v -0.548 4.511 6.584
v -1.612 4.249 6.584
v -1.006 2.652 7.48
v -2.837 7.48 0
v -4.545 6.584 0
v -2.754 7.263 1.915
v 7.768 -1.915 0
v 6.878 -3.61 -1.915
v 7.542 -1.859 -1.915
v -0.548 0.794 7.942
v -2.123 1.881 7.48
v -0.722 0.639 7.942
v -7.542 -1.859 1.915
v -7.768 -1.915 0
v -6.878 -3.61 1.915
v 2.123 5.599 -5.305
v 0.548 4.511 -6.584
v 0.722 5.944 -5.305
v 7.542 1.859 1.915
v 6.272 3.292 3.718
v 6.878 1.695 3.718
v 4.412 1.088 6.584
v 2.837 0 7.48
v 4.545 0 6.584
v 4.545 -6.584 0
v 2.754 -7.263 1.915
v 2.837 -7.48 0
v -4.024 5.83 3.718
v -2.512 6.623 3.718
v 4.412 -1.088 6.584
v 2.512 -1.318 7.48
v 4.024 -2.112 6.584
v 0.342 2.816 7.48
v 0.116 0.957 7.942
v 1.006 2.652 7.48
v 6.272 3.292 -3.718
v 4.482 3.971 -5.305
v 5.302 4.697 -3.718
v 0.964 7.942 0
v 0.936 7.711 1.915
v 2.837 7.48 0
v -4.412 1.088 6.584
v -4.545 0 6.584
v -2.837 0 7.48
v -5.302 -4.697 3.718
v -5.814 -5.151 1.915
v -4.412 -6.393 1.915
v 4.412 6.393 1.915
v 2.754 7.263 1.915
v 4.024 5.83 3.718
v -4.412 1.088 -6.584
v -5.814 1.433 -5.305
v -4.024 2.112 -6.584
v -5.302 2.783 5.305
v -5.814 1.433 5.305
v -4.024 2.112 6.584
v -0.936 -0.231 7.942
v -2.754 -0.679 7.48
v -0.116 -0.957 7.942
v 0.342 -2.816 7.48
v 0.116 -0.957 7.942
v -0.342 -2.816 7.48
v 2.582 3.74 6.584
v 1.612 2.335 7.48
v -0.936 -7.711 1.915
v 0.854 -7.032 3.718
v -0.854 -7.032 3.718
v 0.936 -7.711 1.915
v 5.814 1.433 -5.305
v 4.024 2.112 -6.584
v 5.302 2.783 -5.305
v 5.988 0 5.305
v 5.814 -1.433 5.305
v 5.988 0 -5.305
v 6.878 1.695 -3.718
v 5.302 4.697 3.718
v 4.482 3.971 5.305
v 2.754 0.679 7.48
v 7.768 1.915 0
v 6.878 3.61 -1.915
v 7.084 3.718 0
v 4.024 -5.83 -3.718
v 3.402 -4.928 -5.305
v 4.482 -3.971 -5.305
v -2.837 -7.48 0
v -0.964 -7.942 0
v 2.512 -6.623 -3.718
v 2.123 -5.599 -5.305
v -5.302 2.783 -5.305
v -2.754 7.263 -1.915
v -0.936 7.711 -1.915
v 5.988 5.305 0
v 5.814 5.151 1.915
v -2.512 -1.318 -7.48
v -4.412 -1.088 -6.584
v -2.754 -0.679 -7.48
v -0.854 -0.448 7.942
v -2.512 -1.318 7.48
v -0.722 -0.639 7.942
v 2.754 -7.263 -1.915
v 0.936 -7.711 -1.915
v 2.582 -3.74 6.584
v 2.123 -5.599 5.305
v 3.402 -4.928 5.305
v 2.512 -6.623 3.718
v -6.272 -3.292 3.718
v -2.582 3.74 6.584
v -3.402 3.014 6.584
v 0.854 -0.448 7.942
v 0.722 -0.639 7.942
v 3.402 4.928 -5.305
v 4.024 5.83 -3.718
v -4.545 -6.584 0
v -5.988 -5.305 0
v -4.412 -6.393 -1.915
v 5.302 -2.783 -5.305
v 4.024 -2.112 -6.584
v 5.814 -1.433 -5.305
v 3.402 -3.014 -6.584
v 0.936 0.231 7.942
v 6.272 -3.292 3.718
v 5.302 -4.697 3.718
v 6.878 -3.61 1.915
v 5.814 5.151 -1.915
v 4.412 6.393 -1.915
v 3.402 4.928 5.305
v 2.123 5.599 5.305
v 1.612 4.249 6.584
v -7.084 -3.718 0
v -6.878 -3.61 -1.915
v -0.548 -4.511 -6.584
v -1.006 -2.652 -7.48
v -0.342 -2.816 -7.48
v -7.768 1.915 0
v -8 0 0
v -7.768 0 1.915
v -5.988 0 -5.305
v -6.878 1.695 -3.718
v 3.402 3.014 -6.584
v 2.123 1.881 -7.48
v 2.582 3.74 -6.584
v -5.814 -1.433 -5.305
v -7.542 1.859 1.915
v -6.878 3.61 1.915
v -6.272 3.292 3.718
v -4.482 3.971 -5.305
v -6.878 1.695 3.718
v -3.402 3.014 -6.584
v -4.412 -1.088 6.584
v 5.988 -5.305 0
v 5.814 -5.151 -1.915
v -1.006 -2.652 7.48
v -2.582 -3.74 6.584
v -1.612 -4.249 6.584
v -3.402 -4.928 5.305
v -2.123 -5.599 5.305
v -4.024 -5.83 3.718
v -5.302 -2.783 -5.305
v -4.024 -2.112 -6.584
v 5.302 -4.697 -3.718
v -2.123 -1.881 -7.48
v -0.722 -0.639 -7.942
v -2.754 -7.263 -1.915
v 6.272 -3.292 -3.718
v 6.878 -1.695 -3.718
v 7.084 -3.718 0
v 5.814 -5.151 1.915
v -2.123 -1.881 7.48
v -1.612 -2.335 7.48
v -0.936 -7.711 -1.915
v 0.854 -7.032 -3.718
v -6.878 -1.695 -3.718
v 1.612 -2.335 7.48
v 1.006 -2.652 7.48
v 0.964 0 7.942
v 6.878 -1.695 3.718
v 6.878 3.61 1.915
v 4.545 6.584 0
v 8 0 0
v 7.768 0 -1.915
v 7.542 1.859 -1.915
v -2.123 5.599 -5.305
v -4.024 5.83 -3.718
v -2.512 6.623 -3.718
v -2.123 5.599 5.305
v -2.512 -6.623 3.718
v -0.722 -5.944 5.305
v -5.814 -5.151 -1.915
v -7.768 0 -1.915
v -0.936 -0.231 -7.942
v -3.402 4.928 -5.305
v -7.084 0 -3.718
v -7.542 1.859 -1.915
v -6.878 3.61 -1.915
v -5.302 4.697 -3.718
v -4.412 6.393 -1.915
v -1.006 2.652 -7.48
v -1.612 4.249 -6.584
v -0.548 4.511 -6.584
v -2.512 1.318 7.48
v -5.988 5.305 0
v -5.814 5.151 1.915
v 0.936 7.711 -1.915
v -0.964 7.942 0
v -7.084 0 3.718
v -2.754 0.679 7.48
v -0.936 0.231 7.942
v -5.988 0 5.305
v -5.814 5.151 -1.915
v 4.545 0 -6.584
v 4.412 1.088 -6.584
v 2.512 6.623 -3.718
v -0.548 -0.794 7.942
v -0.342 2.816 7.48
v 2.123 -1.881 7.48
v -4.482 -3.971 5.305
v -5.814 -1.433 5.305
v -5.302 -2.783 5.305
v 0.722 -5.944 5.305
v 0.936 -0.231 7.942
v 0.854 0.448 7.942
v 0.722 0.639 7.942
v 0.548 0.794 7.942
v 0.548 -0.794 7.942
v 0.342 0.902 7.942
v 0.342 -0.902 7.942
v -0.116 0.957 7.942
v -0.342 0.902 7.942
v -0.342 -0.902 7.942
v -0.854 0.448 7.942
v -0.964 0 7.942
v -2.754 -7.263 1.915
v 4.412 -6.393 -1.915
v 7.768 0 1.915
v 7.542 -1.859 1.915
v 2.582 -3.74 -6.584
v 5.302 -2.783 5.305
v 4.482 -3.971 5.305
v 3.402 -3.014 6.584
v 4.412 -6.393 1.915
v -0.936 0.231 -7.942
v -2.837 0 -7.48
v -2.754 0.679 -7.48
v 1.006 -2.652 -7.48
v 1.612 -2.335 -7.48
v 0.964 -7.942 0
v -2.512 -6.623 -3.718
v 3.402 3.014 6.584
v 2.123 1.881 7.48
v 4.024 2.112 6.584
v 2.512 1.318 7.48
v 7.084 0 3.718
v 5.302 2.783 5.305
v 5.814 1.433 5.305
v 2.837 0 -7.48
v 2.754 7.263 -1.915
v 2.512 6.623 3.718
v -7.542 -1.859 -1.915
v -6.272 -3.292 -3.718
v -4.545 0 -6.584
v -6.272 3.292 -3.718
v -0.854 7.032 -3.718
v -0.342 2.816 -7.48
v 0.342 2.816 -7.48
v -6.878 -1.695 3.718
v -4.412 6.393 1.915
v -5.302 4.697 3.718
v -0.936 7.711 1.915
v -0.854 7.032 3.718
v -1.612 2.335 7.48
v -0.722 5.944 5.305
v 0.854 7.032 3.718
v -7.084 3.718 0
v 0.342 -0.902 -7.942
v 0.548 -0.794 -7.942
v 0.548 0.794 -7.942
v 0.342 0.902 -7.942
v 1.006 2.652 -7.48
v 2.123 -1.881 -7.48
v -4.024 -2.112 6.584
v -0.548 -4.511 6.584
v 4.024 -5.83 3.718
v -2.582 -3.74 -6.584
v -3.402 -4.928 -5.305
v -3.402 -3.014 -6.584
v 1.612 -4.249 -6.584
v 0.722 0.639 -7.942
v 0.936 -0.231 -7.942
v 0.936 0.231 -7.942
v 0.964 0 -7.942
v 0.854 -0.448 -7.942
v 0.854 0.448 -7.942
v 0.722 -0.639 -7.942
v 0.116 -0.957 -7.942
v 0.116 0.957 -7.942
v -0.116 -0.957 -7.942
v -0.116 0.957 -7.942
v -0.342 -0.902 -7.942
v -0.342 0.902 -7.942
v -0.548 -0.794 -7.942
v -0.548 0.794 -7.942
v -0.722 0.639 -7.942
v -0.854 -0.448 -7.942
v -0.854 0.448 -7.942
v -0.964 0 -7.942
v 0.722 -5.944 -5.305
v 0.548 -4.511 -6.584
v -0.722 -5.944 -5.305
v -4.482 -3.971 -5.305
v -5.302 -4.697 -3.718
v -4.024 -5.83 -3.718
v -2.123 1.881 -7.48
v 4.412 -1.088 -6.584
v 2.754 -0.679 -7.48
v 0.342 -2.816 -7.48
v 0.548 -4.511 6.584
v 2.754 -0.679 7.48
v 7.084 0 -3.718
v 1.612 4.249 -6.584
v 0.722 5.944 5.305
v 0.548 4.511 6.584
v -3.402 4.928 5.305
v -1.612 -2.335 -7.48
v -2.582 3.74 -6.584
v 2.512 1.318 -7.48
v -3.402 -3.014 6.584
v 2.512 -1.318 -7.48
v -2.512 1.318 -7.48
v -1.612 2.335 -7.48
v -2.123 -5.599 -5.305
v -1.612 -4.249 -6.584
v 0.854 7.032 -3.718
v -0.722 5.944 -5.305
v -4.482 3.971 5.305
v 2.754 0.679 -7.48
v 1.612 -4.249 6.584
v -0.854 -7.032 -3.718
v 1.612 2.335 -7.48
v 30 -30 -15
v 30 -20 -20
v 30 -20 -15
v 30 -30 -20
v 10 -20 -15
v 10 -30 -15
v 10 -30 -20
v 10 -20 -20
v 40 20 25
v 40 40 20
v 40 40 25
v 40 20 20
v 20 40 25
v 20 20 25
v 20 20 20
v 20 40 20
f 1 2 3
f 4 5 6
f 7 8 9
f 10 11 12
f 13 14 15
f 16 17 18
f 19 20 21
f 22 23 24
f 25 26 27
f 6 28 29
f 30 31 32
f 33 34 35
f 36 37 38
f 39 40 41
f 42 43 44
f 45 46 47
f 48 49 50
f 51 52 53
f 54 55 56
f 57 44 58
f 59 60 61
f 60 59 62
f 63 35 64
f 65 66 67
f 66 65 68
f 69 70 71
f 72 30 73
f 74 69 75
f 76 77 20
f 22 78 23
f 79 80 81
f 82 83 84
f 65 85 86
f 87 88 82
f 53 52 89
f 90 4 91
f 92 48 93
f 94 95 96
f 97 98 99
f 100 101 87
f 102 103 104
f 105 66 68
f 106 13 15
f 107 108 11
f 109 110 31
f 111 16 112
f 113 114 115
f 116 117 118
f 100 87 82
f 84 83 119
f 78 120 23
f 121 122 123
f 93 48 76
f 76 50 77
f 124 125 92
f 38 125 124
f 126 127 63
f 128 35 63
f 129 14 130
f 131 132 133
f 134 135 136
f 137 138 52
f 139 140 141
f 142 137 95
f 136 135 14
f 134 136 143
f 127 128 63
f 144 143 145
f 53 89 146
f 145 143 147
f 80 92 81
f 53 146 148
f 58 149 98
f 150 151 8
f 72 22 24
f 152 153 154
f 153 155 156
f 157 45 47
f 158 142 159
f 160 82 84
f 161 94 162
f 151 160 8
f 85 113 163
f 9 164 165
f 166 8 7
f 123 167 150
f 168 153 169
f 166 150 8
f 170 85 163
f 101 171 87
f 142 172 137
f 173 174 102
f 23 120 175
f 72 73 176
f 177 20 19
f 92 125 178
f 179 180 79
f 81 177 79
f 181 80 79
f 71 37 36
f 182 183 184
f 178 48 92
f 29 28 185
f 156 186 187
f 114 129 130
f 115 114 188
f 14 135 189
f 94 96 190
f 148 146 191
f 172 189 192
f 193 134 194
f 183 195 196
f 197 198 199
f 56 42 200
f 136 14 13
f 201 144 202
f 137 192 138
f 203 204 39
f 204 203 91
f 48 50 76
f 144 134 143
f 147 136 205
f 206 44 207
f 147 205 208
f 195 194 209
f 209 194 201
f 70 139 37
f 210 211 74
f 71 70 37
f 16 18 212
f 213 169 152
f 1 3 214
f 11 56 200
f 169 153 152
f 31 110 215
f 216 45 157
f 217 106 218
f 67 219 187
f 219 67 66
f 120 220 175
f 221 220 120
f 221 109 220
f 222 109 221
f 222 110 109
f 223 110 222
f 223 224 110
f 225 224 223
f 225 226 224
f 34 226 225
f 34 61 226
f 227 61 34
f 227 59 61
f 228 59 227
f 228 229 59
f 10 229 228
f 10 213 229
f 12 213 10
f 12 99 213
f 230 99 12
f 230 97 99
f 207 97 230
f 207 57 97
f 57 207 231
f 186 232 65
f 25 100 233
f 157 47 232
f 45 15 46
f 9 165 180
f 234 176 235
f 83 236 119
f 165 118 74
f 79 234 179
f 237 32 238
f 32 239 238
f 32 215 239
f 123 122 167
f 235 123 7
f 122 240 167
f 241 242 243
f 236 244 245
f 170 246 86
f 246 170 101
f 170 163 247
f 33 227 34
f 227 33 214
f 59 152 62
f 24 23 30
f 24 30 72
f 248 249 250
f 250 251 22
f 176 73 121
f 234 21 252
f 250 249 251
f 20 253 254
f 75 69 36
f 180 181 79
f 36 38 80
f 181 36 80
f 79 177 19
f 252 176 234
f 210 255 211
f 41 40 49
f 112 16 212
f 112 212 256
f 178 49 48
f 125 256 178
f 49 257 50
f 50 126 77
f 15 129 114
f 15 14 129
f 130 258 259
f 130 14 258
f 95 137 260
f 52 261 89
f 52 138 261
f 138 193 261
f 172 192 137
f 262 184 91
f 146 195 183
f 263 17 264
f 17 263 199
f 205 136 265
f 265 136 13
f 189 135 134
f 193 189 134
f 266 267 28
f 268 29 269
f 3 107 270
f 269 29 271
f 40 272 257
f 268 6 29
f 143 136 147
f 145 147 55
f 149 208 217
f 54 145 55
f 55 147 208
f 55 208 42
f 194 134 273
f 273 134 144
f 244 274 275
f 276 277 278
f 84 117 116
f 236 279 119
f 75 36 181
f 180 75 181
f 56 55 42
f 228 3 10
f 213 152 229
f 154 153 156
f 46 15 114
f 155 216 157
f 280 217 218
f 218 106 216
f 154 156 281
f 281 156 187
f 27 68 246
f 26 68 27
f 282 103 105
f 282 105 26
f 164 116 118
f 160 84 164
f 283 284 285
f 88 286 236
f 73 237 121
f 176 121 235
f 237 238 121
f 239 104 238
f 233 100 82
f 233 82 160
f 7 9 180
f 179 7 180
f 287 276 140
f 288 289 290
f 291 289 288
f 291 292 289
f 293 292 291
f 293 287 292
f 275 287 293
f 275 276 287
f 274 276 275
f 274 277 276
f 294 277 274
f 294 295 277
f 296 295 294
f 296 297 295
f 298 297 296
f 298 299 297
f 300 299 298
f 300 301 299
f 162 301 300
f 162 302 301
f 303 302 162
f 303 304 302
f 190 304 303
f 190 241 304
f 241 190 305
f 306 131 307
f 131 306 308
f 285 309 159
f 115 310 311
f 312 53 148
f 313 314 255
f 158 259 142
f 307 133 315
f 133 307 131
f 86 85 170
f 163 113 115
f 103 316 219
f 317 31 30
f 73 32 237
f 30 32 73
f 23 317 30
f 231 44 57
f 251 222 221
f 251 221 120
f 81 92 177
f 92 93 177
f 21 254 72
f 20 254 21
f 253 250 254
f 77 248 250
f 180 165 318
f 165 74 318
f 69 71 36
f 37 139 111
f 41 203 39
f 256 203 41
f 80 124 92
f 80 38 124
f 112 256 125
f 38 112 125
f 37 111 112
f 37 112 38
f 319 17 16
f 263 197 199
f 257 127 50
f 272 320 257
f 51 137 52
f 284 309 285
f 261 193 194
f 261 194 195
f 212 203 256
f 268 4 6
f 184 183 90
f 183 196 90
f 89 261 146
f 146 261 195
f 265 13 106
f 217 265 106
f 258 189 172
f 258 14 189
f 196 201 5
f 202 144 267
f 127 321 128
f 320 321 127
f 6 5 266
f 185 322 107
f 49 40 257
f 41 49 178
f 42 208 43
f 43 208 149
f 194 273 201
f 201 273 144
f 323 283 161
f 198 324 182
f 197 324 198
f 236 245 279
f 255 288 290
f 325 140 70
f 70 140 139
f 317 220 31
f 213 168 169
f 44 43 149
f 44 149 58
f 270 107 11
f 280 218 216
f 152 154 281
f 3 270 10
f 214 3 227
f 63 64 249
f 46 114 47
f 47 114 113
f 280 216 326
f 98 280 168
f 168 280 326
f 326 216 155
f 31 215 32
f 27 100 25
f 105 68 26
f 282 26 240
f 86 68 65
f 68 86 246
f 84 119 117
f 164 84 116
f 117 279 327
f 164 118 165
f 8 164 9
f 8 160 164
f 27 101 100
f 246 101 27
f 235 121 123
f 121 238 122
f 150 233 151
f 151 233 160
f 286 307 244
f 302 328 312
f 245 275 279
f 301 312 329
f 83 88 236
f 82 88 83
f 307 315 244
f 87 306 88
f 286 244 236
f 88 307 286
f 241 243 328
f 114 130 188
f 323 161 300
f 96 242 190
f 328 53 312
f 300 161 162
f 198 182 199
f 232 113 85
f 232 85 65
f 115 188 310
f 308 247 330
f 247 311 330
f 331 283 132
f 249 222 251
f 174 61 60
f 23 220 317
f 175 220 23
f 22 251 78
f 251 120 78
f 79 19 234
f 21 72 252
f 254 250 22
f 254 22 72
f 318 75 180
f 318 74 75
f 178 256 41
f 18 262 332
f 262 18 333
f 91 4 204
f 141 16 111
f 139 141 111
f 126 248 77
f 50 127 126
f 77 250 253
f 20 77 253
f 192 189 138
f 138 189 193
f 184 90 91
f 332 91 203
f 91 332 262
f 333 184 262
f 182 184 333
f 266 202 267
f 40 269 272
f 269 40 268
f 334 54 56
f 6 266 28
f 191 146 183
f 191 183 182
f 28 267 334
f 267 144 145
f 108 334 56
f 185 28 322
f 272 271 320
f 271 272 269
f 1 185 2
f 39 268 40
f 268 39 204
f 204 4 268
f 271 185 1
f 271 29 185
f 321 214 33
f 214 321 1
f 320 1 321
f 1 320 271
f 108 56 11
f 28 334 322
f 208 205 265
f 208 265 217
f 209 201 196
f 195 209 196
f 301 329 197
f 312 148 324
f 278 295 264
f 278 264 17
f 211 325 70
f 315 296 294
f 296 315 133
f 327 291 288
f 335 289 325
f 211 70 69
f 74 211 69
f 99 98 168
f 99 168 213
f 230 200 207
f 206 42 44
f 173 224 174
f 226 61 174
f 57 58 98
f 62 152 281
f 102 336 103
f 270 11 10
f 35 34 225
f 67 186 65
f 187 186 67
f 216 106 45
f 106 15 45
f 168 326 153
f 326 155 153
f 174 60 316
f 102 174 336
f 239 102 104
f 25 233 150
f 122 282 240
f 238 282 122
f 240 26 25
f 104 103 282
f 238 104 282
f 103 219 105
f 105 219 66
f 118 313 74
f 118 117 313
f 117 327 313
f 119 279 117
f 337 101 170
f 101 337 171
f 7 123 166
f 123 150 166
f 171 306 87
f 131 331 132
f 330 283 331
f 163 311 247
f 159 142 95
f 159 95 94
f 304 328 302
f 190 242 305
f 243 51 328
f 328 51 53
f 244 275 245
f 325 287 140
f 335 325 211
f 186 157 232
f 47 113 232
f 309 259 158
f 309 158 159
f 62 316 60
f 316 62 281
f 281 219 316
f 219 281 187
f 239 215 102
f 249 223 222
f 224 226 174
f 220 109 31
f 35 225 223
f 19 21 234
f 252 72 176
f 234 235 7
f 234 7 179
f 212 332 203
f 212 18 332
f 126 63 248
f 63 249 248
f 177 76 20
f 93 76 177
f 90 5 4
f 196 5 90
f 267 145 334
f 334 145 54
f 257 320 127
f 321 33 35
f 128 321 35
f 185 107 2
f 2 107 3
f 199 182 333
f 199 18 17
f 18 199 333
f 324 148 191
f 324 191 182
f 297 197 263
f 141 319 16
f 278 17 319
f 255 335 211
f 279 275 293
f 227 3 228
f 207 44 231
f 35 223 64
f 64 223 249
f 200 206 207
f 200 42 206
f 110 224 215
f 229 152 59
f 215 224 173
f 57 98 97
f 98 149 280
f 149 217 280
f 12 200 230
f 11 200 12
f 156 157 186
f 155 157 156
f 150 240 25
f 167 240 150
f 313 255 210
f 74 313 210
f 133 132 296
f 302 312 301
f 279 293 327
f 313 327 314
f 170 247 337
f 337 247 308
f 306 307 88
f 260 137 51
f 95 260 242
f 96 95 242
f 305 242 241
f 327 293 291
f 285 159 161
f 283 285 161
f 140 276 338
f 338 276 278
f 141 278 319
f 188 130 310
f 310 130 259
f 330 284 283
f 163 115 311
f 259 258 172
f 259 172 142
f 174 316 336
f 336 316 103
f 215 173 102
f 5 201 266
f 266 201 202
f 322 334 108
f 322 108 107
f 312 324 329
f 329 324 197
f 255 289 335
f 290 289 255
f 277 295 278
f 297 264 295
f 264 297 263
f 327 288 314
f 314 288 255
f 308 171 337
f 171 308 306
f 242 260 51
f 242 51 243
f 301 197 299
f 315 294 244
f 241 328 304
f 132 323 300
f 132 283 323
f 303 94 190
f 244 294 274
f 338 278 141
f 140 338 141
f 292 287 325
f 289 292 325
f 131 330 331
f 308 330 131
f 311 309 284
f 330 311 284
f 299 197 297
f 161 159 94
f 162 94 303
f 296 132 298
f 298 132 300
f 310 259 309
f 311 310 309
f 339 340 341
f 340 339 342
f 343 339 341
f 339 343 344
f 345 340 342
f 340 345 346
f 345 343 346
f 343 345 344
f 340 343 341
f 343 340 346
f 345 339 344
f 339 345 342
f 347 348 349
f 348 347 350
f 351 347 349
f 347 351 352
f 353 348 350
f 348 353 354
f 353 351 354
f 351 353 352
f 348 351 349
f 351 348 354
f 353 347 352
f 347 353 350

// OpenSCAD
// Generated by generate_scads.py
union() {
  sphere(r=8);
  translate([10,-30,-20]) {
    cube(size=[20,10,5], center=false);
  }
  sphere(r=8);
  translate([20,20,20]) {
    cube(size=[20,20,5], center=false);
  }
}
